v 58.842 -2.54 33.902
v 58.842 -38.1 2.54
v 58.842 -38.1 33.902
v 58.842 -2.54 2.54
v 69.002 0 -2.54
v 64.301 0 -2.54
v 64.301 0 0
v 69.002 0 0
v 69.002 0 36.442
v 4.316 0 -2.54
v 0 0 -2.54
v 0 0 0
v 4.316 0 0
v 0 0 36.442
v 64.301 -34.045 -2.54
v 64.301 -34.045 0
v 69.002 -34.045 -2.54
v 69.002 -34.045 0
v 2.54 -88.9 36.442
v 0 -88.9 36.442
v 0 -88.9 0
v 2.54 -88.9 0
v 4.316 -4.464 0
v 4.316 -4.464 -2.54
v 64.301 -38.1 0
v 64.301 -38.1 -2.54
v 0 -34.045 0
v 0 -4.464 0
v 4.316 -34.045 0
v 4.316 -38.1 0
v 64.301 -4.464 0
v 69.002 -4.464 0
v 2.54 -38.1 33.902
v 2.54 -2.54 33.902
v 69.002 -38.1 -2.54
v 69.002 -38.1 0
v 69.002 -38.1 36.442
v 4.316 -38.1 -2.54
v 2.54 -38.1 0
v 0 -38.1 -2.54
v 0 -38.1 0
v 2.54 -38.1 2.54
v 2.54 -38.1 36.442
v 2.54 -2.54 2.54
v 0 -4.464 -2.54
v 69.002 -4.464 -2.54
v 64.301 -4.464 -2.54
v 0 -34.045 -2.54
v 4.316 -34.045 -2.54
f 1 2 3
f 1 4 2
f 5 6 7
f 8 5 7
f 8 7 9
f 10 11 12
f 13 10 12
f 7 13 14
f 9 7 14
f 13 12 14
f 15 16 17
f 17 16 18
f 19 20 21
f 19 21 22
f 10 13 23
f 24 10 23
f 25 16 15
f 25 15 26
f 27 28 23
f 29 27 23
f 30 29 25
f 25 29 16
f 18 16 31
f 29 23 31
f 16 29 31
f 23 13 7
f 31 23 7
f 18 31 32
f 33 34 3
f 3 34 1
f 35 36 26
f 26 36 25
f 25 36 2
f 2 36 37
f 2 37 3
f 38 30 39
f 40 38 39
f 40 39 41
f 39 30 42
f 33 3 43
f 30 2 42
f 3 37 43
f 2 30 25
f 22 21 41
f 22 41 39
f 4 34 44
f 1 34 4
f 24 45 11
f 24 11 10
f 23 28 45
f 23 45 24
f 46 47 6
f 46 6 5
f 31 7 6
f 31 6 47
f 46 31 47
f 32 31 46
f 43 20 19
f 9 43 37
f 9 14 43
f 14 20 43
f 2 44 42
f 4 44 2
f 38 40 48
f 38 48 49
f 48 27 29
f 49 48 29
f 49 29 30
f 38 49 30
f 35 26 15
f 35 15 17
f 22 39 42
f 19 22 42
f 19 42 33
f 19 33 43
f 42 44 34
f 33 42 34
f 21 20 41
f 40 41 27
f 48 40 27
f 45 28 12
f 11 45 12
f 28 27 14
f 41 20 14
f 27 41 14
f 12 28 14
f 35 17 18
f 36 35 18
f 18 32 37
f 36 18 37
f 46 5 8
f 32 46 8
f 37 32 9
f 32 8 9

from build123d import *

# Parameters (mm, degrees)
F0_W     = 61.3819211721
F0_H     = 36.4417210221
F1_DEPTH = 38.1
F2_T     = -2.54
F3_DEPTH = 7.62
F4_W     = 2.54
F4_H     = 36.4417210221
F5_DEPTH = 50.8
F6_W     = 4.7011679959
F6_H     = 4.0546688199
F6_H_2   = 4.4637494721
F6_W_2   = 4.3158759363
F7_DEPTH = 2.54


with BuildPart() as f1:
    # F0 (on Front) → F1 (new body)
    with BuildSketch(Plane.XZ):
        with Locations((30.6909605861, 18.2208605111)):
            Rectangle(F0_W, F0_H)
    extrude(amount=F1_DEPTH)

    # F2
    f2_openings = [f1.faces().sort_by_distance(p)[0] for p in [
        (30.690961, -38.1, 18.220861),
    ]]
    offset(amount=F2_T, openings=f2_openings)

    # F3 (add): a face of the model
    f3_faces = [f1.faces().sort_by_distance(p)[0] for p in [
        (61.3819211721, -19.05, 18.2208605111),
    ]]
    extrude(f3_faces, amount=F3_DEPTH)

    # F4 (on face) → F5 (join)
    with BuildSketch(Plane.XZ.offset(38.1)):
        with Locations((1.27, 18.2208605111)):
            Rectangle(F4_W, F4_H)
    extrude(amount=F5_DEPTH)

    # F6 (on face) → F7 (join)
    with BuildSketch(Plane(origin=(0, 0, 0), x_dir=(1, 0, 0), z_dir=(0, 0, -1))):
        Polygon((4.3158759363, 38.1), (2.54, 38.1), (0, 38.1), (0, 34.0453311801), (4.3158759363, 34.0453311801), align=None)
        with Locations((66.6513371742, 36.07266559)):
            Rectangle(F6_W, F6_H)
        with Locations((66.6513371742, 2.231874736)):
            Rectangle(F6_W, F6_H_2)
        with Locations((2.1579379681, 2.231874736)):
            Rectangle(F6_W_2, F6_H_2)
    extrude(amount=F7_DEPTH)


solid = f1.part
